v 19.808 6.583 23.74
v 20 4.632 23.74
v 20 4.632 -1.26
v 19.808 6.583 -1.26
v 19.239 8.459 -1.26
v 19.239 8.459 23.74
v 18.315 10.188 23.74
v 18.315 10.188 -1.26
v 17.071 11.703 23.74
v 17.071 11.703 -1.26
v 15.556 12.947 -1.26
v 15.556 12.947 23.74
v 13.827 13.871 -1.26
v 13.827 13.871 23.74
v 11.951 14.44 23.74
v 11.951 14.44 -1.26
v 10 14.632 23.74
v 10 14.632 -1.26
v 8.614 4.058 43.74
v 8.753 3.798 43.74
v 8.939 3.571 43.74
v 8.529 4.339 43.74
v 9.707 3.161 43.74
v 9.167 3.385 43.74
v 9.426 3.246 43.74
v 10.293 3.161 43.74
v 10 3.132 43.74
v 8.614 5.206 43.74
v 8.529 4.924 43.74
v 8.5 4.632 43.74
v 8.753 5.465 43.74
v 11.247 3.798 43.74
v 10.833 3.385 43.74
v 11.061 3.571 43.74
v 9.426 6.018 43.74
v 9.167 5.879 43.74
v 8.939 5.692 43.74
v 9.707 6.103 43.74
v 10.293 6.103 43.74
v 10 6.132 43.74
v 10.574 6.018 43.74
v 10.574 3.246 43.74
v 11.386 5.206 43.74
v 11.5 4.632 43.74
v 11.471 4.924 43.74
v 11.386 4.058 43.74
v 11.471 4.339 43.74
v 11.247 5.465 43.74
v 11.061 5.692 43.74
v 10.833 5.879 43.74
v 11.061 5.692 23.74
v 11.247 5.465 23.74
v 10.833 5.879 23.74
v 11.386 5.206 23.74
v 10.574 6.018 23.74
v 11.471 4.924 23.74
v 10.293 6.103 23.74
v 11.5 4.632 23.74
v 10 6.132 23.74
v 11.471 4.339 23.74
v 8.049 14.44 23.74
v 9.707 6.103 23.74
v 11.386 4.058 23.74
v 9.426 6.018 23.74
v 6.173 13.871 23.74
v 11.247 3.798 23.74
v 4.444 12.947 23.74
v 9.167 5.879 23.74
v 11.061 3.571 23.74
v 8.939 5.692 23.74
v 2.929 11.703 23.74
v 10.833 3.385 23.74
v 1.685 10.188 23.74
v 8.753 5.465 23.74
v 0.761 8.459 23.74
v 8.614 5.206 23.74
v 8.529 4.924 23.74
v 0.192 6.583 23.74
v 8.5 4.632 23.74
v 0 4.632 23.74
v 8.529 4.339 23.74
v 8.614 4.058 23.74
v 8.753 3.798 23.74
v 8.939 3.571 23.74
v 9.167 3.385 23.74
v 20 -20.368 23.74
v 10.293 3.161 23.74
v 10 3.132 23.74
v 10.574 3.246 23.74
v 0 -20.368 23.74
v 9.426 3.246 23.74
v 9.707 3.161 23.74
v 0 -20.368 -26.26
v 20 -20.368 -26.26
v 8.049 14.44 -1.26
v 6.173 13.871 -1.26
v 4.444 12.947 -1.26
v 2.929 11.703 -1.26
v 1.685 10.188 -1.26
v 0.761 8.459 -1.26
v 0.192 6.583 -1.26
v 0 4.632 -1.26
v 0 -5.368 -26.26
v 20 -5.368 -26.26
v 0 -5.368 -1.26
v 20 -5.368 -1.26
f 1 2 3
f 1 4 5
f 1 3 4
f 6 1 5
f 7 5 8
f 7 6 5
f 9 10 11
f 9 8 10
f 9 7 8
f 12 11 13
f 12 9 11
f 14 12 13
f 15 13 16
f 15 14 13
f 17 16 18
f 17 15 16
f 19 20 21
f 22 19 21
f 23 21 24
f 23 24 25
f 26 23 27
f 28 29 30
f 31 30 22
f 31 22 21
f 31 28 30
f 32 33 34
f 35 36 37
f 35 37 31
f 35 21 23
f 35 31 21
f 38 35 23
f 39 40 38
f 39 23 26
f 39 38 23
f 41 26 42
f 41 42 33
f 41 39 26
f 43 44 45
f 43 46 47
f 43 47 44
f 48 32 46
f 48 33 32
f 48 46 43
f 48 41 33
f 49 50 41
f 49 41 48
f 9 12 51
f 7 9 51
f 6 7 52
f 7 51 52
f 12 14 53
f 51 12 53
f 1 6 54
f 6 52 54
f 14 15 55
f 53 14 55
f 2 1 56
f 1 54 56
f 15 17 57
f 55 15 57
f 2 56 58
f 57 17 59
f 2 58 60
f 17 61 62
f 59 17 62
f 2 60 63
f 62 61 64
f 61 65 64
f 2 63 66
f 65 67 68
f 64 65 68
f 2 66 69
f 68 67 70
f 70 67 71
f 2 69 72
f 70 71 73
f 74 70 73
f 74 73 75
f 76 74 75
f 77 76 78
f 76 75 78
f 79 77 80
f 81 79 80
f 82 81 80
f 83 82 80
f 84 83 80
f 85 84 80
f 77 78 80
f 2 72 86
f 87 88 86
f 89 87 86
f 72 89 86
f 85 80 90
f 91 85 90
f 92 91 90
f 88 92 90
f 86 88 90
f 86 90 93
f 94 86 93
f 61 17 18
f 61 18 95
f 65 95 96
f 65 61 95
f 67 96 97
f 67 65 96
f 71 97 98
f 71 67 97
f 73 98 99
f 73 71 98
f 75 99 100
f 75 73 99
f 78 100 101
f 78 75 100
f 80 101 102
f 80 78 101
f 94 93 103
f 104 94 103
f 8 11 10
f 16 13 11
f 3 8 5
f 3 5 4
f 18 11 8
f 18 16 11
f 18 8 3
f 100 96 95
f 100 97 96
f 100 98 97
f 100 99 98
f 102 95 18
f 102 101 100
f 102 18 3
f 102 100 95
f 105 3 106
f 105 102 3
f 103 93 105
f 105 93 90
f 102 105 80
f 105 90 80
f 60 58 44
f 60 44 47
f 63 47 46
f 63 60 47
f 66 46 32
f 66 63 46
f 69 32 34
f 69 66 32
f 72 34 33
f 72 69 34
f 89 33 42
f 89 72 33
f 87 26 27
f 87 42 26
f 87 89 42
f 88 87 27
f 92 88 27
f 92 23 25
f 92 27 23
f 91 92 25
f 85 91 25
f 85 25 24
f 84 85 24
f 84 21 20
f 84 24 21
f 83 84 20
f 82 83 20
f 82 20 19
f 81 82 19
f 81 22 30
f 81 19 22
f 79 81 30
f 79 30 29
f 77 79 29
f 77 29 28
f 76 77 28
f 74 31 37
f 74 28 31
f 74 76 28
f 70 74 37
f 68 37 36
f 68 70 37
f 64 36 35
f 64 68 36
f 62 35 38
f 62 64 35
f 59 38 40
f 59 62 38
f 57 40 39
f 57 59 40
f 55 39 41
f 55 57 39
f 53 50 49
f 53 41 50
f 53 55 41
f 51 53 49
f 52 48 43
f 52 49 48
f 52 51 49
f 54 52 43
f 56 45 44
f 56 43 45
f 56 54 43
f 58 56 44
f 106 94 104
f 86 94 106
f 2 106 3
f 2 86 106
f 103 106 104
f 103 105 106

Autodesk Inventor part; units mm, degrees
ref_plane "YZ Plane" through (0, 0, 0) normal (1, 0, 0) x (0, 1, 0)
ref_plane "XZ Plane" through (0, 0, 0) normal (0, 1, 0) x (-1, 0, 0)
ref_plane "XY Plane" through (0, 0, 0) normal (0, 0, 1) x (1, 0, 0)
sketch "Sketch1" plane through (0, 0, 0) normal (1, 0, 0) x (0, 1, 0)
  line L0 (14.6318, 23.7403) -> (-20.3682, 23.7403)
  line L1 (-20.3682, 23.7403) -> (-20.3682, -26.2597)
  line L2 (-20.3682, -26.2597) -> (-5.3682, -26.2597)
  line L3 (14.6318, -1.2597) -> (14.6318, 23.7403)
  line L4 (14.6318, -1.2597) -> (-5.3682, -1.2597)
  line L5 (-5.3682, -1.2597) -> (-5.3682, -26.2597)
  point P0 (0, 0)
  dimension "d8" = 35
  dimension "d9" = 25
  dimension "d10" = 20
  dimension "d11" = 25
  dimension "d12" = 50
extrude "Extrusion1" add sketch "Sketch1" along normal blind 20
fillet "Fillet1" radius 10 2 edges at (20, 14.6318, 11.2403) (0, 14.6318, 11.2403)
sketch "Sketch3" plane through (0, -20.3682, 23.7403) normal (0, 0, 1) x (1, 0, 0)
  circle A0 centre (10, 25) radius 1.5
  arc A1 (20, 25) -> (0, 25) centre (10, 25) ccw projected
  point P0 (0, 20.3682)
  dimension "d5" = 3
extrude "Extrusion2" add sketch "Sketch3" along normal blind 20
properties part number "Motor"
